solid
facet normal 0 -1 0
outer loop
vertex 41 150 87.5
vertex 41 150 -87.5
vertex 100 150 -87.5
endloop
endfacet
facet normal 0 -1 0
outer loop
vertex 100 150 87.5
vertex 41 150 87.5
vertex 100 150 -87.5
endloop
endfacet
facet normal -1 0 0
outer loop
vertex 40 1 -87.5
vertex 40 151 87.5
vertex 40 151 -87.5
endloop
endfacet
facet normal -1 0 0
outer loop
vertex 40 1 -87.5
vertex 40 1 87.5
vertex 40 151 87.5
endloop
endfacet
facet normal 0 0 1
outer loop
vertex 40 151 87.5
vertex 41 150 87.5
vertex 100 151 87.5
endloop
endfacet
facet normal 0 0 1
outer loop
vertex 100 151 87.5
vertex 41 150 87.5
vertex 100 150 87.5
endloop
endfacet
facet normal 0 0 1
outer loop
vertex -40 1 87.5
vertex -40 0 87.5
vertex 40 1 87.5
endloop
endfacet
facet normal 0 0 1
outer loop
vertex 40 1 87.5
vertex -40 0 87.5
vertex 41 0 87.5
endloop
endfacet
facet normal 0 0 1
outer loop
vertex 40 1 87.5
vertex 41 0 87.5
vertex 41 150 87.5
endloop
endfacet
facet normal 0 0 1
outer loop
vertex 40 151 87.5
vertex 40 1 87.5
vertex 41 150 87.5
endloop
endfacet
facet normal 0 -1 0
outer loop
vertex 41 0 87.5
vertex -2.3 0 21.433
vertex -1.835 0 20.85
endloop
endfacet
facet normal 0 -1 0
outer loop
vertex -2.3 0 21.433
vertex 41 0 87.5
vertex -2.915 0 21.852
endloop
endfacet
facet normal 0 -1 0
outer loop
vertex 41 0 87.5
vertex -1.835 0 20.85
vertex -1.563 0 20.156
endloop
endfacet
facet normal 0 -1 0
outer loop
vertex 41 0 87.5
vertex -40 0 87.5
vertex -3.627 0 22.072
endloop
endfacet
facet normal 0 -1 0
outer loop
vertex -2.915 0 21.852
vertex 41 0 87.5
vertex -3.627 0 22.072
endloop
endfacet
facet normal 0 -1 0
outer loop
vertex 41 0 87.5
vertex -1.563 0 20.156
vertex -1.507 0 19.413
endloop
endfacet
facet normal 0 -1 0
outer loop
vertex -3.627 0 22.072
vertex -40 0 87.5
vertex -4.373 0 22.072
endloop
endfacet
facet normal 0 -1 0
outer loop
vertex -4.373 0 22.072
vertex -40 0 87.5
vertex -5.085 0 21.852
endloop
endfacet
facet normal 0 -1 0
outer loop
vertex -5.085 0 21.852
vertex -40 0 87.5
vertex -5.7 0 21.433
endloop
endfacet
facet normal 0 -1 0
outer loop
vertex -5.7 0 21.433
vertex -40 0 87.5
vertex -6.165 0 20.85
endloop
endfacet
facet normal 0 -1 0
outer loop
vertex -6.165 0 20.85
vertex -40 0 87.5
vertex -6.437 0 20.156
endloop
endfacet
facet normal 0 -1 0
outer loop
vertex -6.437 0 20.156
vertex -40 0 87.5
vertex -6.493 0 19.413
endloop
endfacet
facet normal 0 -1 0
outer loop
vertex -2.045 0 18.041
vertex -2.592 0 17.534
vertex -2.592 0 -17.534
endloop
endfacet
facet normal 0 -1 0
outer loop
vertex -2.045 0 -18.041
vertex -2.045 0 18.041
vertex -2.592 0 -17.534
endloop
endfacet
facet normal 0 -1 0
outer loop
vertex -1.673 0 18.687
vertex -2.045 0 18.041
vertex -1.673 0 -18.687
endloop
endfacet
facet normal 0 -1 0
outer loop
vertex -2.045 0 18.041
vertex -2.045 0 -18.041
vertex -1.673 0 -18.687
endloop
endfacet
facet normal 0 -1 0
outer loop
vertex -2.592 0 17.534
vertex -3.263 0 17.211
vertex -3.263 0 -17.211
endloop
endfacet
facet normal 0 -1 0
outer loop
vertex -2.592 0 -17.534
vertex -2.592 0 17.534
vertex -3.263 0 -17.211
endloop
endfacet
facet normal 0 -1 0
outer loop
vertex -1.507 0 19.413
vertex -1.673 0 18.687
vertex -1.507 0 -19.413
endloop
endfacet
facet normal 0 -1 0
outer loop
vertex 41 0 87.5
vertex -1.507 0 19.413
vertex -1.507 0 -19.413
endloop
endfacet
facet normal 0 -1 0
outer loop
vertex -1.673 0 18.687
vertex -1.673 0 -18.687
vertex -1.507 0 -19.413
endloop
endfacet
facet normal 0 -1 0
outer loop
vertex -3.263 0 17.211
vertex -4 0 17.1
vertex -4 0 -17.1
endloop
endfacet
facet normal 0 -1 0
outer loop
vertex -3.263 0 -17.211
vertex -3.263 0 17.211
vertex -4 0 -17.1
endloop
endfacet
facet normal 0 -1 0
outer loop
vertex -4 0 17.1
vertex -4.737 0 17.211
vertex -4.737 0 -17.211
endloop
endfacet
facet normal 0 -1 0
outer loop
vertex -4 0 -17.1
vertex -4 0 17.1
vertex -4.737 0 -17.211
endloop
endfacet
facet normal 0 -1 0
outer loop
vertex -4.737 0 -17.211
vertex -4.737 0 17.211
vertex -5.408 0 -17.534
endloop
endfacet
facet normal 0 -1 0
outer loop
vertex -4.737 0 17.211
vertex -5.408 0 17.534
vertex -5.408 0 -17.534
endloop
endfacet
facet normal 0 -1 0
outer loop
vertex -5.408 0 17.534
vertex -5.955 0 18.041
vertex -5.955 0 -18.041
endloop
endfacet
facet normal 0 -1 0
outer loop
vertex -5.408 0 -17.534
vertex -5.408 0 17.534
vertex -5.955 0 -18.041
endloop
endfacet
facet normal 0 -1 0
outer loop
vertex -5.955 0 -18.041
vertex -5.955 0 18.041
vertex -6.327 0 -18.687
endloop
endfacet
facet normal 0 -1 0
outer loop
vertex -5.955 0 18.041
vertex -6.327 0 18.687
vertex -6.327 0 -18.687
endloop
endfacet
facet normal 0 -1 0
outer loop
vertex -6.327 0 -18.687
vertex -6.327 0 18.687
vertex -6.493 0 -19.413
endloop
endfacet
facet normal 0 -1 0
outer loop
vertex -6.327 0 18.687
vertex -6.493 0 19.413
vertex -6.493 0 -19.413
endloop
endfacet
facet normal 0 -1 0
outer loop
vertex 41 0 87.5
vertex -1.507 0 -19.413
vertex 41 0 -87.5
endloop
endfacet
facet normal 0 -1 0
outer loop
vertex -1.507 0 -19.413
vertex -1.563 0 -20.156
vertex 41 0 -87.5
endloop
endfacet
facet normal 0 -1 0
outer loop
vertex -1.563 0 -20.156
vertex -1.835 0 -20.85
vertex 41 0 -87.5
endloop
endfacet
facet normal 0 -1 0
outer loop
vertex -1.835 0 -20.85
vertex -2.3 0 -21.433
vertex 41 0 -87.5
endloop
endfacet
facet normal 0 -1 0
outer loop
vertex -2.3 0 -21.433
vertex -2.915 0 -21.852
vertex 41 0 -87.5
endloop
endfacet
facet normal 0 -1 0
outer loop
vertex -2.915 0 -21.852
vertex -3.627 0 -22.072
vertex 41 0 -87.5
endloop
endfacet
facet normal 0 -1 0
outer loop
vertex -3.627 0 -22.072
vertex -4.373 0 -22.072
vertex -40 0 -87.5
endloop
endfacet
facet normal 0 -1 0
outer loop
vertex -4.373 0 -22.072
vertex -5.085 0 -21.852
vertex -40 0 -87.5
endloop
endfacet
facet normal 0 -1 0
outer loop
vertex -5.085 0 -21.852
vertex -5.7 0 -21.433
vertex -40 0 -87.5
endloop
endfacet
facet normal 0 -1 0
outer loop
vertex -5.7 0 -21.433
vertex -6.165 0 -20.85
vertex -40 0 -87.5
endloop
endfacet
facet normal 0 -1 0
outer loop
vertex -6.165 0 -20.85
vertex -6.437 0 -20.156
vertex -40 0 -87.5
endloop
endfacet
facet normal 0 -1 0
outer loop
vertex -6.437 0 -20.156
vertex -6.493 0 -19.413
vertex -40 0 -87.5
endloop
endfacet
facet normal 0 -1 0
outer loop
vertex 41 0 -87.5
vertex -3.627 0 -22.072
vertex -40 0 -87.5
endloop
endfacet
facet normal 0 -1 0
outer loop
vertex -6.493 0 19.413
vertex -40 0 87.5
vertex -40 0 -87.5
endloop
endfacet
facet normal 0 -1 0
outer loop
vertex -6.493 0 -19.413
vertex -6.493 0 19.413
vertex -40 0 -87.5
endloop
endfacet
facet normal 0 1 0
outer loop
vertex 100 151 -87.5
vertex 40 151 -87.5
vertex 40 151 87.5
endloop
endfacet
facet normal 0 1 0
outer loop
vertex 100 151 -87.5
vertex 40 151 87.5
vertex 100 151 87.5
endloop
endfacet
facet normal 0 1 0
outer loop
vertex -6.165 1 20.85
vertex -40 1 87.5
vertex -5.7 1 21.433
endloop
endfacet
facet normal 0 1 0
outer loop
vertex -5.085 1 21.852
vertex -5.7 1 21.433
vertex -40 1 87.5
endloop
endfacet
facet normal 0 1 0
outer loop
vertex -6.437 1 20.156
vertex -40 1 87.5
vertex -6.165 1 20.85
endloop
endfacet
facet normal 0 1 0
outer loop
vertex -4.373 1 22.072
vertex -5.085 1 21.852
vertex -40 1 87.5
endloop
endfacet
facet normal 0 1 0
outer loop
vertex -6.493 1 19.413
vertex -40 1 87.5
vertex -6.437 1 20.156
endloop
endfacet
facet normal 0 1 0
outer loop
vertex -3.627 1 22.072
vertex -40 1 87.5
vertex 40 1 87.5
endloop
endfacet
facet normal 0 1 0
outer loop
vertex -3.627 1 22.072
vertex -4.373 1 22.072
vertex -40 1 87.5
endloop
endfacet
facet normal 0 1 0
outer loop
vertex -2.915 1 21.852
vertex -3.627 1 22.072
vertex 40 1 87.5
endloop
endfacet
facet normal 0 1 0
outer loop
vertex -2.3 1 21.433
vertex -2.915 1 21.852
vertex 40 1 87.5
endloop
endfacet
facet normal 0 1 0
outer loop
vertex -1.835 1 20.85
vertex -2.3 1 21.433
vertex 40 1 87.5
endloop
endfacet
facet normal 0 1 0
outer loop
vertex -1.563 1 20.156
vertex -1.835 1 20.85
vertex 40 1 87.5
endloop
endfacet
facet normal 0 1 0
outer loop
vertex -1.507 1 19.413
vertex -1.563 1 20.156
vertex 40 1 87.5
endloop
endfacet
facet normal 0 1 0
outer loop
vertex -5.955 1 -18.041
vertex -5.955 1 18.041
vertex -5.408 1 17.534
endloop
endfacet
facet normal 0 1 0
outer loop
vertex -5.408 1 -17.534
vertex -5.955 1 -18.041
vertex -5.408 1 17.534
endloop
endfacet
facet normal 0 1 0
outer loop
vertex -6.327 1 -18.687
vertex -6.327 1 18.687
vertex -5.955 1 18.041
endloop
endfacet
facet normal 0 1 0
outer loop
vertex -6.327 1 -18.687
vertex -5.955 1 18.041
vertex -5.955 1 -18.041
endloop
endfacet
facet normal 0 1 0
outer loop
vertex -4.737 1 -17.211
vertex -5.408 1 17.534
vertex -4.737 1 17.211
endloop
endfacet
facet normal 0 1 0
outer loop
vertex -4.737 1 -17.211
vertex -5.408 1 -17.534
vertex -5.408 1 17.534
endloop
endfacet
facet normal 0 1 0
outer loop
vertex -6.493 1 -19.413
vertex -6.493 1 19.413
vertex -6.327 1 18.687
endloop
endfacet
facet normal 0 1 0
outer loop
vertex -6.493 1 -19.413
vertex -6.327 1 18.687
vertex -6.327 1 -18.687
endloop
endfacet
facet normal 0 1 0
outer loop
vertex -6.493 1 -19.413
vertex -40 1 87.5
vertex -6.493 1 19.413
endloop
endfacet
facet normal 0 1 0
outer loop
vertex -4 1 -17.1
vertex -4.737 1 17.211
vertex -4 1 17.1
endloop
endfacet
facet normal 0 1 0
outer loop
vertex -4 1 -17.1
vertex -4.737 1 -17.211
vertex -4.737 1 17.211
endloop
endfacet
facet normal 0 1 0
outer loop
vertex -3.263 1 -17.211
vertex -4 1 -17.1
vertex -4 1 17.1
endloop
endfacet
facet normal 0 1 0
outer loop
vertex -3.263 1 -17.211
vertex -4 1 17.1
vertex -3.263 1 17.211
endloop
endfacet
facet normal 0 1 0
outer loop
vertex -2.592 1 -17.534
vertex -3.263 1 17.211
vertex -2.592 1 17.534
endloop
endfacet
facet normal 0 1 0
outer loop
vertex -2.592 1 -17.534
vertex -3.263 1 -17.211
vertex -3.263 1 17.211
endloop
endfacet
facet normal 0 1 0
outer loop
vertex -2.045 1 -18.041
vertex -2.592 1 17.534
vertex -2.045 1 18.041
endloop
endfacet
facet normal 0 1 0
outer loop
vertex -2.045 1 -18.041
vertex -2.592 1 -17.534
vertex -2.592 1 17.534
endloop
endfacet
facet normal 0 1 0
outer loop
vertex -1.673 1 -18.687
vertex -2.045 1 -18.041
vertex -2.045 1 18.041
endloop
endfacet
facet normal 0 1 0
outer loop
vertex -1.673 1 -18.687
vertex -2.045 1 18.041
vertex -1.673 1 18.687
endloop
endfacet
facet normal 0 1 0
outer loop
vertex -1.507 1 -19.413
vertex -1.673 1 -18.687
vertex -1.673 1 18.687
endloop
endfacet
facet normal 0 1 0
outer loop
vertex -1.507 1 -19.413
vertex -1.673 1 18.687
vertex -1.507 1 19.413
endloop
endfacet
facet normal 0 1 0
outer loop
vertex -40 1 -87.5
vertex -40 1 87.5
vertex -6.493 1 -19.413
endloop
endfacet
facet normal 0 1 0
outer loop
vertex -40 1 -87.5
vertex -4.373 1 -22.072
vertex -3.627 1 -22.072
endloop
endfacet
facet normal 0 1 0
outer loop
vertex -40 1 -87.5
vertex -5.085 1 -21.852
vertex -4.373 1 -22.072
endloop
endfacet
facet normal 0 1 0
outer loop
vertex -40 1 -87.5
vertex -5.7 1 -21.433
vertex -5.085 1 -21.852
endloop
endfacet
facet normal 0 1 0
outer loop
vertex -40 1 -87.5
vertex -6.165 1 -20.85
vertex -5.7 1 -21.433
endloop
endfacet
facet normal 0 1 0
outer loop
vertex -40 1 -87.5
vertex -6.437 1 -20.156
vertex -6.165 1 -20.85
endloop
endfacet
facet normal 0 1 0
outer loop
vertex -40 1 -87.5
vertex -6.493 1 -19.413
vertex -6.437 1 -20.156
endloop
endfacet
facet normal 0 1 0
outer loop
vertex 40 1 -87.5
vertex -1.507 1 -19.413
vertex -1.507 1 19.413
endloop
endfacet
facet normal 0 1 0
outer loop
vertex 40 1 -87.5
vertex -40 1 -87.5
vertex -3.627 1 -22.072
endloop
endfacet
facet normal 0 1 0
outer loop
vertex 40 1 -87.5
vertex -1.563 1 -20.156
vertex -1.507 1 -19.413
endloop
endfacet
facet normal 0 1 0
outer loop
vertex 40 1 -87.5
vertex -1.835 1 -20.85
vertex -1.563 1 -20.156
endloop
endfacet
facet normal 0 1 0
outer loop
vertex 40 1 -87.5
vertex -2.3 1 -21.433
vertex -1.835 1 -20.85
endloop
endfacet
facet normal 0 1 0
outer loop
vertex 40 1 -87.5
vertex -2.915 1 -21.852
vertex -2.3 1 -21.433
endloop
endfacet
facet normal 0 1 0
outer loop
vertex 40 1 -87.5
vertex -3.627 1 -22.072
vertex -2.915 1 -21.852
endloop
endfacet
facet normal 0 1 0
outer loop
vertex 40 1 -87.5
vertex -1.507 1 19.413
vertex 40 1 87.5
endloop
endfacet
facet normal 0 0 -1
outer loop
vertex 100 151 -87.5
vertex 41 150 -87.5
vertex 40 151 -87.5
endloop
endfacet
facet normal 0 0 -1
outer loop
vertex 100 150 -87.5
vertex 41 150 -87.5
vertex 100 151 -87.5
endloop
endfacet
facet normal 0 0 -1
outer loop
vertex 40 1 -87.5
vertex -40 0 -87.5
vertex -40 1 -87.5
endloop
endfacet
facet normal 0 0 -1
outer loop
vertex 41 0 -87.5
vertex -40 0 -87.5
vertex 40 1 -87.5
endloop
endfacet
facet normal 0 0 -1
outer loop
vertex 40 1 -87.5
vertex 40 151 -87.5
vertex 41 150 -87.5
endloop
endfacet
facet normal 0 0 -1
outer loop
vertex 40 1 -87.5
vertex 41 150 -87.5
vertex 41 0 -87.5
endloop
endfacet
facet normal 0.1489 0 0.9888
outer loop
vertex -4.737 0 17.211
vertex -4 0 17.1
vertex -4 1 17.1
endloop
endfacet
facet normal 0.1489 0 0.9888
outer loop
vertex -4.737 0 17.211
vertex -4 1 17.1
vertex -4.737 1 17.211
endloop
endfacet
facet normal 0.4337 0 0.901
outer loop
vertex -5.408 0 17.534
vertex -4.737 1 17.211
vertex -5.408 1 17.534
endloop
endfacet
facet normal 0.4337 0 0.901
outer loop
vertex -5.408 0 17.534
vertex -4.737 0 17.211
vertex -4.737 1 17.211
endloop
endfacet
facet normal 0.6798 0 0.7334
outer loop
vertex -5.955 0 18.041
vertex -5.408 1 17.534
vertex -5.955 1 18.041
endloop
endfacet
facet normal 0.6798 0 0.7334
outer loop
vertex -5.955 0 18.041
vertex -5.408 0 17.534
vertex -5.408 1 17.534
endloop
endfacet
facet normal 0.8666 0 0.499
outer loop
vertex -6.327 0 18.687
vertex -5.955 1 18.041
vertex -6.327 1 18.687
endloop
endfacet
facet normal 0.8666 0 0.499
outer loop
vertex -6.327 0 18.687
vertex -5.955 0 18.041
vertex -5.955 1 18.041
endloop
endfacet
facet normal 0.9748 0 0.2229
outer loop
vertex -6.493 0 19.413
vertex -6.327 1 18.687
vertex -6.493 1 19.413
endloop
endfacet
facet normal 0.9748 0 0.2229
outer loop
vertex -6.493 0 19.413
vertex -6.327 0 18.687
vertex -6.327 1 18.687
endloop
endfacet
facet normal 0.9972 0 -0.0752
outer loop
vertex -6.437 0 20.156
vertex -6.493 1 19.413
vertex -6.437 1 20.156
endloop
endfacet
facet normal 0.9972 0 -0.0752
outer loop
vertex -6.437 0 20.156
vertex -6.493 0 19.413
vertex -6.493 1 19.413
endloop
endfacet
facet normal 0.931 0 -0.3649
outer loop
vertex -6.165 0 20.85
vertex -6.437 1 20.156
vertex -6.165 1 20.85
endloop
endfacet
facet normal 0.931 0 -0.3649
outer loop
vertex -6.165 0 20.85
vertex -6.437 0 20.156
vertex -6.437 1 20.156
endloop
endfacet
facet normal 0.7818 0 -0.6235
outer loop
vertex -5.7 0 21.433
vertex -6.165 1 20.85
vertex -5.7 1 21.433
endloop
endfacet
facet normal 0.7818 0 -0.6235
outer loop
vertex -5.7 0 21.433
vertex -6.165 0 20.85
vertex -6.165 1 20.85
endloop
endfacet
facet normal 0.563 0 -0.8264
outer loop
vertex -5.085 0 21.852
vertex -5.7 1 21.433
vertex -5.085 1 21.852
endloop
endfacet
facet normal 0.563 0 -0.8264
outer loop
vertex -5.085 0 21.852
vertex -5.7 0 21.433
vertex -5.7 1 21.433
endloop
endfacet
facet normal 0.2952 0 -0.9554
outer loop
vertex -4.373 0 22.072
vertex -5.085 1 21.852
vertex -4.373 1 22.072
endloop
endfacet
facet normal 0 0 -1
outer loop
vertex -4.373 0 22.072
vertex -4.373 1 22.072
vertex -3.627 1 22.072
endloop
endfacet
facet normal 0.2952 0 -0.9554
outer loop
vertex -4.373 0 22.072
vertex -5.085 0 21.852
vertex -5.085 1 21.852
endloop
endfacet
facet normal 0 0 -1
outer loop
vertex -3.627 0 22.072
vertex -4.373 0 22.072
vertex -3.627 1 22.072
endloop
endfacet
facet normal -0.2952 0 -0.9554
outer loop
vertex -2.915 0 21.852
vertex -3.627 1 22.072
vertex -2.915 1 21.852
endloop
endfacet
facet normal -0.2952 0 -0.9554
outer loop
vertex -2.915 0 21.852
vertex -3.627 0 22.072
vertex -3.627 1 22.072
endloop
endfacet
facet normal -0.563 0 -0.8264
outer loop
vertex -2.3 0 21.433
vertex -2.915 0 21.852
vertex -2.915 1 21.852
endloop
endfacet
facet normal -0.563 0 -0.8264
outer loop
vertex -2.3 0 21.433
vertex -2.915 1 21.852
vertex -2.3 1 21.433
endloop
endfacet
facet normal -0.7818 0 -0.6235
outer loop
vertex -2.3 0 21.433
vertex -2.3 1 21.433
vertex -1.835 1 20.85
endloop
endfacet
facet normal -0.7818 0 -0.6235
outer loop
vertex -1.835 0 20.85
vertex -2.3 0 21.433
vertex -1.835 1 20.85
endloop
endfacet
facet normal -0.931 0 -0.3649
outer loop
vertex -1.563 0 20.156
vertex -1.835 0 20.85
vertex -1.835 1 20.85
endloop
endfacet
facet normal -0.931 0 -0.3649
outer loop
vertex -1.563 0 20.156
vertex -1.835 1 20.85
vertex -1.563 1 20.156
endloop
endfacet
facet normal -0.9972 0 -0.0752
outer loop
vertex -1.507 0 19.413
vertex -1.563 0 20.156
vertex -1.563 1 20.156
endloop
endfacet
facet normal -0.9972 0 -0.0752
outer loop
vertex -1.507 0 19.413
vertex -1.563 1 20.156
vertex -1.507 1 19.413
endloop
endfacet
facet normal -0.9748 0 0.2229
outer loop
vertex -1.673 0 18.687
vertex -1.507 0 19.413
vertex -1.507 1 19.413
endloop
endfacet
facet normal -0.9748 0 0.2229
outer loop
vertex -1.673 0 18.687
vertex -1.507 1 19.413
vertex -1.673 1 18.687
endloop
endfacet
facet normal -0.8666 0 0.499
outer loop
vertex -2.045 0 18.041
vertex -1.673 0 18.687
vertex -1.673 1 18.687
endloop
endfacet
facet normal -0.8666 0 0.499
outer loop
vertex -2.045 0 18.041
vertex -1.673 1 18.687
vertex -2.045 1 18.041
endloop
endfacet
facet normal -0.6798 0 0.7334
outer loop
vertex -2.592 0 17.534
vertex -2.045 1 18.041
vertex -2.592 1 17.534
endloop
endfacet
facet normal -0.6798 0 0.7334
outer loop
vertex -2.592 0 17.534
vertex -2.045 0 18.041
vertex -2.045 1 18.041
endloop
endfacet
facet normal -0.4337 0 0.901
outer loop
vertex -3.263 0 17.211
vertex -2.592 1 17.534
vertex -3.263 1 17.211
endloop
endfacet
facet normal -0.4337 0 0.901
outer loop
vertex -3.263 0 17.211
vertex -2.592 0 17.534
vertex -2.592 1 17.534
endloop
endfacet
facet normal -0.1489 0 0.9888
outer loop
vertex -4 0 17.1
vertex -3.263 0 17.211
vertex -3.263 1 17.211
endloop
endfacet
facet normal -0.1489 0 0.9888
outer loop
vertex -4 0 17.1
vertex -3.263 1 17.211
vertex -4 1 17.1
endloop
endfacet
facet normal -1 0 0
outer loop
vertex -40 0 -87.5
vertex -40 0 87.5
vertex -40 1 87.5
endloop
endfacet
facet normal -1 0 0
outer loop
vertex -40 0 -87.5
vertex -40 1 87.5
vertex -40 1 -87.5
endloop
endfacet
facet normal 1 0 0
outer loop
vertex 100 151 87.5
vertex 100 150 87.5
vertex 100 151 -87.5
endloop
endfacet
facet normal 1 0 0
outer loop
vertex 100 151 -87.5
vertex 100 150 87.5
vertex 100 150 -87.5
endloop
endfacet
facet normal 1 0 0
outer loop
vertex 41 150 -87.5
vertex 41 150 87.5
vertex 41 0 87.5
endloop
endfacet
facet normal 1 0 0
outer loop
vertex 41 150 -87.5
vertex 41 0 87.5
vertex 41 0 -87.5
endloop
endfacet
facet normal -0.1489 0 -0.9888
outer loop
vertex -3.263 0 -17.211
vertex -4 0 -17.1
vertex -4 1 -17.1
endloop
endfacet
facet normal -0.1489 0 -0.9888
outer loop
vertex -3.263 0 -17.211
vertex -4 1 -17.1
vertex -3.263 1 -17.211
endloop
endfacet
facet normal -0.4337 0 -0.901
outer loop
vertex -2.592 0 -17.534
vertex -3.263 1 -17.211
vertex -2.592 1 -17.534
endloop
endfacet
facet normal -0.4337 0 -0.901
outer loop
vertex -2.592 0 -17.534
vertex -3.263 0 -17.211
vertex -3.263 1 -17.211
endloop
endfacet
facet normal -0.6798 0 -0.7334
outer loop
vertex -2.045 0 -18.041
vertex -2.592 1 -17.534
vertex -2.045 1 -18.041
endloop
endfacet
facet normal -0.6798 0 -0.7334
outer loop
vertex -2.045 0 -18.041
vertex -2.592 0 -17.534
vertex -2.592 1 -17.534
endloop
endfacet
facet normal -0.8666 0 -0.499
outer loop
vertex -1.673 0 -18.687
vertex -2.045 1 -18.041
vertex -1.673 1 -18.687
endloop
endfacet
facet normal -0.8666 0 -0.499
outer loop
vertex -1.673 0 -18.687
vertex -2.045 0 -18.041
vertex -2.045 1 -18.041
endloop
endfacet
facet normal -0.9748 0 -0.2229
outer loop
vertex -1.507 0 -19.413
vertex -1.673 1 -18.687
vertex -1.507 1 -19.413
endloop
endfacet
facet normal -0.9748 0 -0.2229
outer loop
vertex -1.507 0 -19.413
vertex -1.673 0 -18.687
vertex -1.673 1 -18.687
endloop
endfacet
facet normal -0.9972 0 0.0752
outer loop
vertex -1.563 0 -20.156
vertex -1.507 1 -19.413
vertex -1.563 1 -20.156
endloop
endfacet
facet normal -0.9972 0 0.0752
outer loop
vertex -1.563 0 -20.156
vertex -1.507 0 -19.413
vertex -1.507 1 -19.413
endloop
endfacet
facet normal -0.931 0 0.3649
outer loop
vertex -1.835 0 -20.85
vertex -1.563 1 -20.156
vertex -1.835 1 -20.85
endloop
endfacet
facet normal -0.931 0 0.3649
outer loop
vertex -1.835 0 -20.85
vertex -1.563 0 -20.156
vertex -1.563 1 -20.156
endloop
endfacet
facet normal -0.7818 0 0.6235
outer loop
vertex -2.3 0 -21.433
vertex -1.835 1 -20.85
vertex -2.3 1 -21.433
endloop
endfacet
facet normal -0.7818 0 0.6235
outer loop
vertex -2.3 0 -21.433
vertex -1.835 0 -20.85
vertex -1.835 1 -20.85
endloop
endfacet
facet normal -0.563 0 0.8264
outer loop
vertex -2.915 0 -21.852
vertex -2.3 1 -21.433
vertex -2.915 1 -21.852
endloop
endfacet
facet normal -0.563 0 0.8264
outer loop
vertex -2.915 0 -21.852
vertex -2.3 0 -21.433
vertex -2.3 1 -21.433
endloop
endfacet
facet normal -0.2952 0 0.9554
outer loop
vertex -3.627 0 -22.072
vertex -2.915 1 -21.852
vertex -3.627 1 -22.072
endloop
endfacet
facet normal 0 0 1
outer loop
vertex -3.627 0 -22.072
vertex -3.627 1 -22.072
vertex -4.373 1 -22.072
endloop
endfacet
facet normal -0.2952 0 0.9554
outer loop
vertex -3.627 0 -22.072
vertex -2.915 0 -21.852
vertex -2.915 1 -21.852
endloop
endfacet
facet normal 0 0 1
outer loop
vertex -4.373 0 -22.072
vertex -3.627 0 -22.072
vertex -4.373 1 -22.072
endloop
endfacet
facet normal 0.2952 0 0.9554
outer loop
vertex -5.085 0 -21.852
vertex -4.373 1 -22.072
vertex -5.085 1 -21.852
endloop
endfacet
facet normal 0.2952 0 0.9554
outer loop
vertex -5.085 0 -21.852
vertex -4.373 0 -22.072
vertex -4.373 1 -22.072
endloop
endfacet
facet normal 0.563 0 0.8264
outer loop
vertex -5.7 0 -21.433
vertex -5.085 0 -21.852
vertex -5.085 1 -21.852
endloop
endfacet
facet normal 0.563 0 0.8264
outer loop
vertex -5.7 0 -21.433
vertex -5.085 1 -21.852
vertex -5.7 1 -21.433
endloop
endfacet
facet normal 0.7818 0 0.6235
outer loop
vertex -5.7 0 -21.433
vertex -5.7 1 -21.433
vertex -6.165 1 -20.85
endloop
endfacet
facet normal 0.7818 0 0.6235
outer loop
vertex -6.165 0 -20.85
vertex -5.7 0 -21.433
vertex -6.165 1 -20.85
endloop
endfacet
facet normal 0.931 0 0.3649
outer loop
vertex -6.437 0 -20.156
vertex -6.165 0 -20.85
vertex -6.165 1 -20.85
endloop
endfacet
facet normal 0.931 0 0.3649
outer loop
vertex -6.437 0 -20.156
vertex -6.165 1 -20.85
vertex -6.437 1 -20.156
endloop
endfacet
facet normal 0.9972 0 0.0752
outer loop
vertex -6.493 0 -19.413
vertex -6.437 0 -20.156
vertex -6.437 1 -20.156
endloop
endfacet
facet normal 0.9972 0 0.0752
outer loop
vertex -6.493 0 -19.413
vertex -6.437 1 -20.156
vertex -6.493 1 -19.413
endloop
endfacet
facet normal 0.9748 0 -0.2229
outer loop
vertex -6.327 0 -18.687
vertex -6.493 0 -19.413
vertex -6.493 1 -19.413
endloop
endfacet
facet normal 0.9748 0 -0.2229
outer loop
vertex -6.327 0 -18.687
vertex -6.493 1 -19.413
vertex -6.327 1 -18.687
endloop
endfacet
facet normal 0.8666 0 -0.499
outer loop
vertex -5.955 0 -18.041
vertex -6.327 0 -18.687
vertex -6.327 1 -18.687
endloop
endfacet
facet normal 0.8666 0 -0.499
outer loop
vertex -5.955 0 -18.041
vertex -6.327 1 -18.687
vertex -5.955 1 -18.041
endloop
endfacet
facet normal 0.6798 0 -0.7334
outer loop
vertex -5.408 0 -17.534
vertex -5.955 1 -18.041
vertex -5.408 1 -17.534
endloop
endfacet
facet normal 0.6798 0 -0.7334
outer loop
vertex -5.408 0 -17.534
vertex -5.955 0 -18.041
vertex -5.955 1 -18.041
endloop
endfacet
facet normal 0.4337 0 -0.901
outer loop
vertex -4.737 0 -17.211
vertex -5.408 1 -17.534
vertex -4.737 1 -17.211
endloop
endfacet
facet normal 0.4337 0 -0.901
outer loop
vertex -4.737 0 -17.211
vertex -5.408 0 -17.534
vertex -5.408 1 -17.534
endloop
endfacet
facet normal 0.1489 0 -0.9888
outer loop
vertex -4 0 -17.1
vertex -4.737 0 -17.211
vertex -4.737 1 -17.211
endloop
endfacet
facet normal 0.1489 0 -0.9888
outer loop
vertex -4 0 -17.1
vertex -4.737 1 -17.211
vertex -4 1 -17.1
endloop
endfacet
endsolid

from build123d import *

# Parameters (mm, degrees)
SKETCH1_W           = 80
SKETCH1_H           = 175
SKETCH1_R           = 2.5
BOSS_EXTRUDE1_DEPTH = 1
SKETCH2_W           = 175
SKETCH2_H           = 150
BOSS_EXTRUDE2_DEPTH = 1
SKETCH3_W           = 60
SKETCH3_H           = 175
BOSS_EXTRUDE3_DEPTH = 1


with BuildPart() as part:
    # Sketch1 → Boss-Extrude1 (new body)
    with BuildSketch(Plane(origin=(0, 0, 0), x_dir=(1, 0, 0), z_dir=(0, 1, 0))):
        Rectangle(SKETCH1_W, SKETCH1_H)
        with Locations(Location((-4, 19.6, 0), (0, 0, 270))):
            Circle(SKETCH1_R, mode=Mode.SUBTRACT)
        with Locations(Location((-4, -19.6, 0), (0, 0, 90))):
            Circle(SKETCH1_R, mode=Mode.SUBTRACT)
    extrude(amount=BOSS_EXTRUDE1_DEPTH)

    # Sketch2 → Boss-Extrude2 (add)
    with BuildSketch(Plane(origin=(40, 0, 0), x_dir=(0, 0, -1), z_dir=(1, 0, 0))):
        with Locations((0, 75)):
            Rectangle(SKETCH2_W, SKETCH2_H)
    extrude(amount=BOSS_EXTRUDE2_DEPTH)

    # Sketch3 → Boss-Extrude3 (add)
    with BuildSketch(Plane(origin=(0, 150, 0), x_dir=(1, 0, 0), z_dir=(0, 1, 0))):
        with Locations((70, 0)):
            Rectangle(SKETCH3_W, SKETCH3_H)
    extrude(amount=BOSS_EXTRUDE3_DEPTH)


solid = part.part
